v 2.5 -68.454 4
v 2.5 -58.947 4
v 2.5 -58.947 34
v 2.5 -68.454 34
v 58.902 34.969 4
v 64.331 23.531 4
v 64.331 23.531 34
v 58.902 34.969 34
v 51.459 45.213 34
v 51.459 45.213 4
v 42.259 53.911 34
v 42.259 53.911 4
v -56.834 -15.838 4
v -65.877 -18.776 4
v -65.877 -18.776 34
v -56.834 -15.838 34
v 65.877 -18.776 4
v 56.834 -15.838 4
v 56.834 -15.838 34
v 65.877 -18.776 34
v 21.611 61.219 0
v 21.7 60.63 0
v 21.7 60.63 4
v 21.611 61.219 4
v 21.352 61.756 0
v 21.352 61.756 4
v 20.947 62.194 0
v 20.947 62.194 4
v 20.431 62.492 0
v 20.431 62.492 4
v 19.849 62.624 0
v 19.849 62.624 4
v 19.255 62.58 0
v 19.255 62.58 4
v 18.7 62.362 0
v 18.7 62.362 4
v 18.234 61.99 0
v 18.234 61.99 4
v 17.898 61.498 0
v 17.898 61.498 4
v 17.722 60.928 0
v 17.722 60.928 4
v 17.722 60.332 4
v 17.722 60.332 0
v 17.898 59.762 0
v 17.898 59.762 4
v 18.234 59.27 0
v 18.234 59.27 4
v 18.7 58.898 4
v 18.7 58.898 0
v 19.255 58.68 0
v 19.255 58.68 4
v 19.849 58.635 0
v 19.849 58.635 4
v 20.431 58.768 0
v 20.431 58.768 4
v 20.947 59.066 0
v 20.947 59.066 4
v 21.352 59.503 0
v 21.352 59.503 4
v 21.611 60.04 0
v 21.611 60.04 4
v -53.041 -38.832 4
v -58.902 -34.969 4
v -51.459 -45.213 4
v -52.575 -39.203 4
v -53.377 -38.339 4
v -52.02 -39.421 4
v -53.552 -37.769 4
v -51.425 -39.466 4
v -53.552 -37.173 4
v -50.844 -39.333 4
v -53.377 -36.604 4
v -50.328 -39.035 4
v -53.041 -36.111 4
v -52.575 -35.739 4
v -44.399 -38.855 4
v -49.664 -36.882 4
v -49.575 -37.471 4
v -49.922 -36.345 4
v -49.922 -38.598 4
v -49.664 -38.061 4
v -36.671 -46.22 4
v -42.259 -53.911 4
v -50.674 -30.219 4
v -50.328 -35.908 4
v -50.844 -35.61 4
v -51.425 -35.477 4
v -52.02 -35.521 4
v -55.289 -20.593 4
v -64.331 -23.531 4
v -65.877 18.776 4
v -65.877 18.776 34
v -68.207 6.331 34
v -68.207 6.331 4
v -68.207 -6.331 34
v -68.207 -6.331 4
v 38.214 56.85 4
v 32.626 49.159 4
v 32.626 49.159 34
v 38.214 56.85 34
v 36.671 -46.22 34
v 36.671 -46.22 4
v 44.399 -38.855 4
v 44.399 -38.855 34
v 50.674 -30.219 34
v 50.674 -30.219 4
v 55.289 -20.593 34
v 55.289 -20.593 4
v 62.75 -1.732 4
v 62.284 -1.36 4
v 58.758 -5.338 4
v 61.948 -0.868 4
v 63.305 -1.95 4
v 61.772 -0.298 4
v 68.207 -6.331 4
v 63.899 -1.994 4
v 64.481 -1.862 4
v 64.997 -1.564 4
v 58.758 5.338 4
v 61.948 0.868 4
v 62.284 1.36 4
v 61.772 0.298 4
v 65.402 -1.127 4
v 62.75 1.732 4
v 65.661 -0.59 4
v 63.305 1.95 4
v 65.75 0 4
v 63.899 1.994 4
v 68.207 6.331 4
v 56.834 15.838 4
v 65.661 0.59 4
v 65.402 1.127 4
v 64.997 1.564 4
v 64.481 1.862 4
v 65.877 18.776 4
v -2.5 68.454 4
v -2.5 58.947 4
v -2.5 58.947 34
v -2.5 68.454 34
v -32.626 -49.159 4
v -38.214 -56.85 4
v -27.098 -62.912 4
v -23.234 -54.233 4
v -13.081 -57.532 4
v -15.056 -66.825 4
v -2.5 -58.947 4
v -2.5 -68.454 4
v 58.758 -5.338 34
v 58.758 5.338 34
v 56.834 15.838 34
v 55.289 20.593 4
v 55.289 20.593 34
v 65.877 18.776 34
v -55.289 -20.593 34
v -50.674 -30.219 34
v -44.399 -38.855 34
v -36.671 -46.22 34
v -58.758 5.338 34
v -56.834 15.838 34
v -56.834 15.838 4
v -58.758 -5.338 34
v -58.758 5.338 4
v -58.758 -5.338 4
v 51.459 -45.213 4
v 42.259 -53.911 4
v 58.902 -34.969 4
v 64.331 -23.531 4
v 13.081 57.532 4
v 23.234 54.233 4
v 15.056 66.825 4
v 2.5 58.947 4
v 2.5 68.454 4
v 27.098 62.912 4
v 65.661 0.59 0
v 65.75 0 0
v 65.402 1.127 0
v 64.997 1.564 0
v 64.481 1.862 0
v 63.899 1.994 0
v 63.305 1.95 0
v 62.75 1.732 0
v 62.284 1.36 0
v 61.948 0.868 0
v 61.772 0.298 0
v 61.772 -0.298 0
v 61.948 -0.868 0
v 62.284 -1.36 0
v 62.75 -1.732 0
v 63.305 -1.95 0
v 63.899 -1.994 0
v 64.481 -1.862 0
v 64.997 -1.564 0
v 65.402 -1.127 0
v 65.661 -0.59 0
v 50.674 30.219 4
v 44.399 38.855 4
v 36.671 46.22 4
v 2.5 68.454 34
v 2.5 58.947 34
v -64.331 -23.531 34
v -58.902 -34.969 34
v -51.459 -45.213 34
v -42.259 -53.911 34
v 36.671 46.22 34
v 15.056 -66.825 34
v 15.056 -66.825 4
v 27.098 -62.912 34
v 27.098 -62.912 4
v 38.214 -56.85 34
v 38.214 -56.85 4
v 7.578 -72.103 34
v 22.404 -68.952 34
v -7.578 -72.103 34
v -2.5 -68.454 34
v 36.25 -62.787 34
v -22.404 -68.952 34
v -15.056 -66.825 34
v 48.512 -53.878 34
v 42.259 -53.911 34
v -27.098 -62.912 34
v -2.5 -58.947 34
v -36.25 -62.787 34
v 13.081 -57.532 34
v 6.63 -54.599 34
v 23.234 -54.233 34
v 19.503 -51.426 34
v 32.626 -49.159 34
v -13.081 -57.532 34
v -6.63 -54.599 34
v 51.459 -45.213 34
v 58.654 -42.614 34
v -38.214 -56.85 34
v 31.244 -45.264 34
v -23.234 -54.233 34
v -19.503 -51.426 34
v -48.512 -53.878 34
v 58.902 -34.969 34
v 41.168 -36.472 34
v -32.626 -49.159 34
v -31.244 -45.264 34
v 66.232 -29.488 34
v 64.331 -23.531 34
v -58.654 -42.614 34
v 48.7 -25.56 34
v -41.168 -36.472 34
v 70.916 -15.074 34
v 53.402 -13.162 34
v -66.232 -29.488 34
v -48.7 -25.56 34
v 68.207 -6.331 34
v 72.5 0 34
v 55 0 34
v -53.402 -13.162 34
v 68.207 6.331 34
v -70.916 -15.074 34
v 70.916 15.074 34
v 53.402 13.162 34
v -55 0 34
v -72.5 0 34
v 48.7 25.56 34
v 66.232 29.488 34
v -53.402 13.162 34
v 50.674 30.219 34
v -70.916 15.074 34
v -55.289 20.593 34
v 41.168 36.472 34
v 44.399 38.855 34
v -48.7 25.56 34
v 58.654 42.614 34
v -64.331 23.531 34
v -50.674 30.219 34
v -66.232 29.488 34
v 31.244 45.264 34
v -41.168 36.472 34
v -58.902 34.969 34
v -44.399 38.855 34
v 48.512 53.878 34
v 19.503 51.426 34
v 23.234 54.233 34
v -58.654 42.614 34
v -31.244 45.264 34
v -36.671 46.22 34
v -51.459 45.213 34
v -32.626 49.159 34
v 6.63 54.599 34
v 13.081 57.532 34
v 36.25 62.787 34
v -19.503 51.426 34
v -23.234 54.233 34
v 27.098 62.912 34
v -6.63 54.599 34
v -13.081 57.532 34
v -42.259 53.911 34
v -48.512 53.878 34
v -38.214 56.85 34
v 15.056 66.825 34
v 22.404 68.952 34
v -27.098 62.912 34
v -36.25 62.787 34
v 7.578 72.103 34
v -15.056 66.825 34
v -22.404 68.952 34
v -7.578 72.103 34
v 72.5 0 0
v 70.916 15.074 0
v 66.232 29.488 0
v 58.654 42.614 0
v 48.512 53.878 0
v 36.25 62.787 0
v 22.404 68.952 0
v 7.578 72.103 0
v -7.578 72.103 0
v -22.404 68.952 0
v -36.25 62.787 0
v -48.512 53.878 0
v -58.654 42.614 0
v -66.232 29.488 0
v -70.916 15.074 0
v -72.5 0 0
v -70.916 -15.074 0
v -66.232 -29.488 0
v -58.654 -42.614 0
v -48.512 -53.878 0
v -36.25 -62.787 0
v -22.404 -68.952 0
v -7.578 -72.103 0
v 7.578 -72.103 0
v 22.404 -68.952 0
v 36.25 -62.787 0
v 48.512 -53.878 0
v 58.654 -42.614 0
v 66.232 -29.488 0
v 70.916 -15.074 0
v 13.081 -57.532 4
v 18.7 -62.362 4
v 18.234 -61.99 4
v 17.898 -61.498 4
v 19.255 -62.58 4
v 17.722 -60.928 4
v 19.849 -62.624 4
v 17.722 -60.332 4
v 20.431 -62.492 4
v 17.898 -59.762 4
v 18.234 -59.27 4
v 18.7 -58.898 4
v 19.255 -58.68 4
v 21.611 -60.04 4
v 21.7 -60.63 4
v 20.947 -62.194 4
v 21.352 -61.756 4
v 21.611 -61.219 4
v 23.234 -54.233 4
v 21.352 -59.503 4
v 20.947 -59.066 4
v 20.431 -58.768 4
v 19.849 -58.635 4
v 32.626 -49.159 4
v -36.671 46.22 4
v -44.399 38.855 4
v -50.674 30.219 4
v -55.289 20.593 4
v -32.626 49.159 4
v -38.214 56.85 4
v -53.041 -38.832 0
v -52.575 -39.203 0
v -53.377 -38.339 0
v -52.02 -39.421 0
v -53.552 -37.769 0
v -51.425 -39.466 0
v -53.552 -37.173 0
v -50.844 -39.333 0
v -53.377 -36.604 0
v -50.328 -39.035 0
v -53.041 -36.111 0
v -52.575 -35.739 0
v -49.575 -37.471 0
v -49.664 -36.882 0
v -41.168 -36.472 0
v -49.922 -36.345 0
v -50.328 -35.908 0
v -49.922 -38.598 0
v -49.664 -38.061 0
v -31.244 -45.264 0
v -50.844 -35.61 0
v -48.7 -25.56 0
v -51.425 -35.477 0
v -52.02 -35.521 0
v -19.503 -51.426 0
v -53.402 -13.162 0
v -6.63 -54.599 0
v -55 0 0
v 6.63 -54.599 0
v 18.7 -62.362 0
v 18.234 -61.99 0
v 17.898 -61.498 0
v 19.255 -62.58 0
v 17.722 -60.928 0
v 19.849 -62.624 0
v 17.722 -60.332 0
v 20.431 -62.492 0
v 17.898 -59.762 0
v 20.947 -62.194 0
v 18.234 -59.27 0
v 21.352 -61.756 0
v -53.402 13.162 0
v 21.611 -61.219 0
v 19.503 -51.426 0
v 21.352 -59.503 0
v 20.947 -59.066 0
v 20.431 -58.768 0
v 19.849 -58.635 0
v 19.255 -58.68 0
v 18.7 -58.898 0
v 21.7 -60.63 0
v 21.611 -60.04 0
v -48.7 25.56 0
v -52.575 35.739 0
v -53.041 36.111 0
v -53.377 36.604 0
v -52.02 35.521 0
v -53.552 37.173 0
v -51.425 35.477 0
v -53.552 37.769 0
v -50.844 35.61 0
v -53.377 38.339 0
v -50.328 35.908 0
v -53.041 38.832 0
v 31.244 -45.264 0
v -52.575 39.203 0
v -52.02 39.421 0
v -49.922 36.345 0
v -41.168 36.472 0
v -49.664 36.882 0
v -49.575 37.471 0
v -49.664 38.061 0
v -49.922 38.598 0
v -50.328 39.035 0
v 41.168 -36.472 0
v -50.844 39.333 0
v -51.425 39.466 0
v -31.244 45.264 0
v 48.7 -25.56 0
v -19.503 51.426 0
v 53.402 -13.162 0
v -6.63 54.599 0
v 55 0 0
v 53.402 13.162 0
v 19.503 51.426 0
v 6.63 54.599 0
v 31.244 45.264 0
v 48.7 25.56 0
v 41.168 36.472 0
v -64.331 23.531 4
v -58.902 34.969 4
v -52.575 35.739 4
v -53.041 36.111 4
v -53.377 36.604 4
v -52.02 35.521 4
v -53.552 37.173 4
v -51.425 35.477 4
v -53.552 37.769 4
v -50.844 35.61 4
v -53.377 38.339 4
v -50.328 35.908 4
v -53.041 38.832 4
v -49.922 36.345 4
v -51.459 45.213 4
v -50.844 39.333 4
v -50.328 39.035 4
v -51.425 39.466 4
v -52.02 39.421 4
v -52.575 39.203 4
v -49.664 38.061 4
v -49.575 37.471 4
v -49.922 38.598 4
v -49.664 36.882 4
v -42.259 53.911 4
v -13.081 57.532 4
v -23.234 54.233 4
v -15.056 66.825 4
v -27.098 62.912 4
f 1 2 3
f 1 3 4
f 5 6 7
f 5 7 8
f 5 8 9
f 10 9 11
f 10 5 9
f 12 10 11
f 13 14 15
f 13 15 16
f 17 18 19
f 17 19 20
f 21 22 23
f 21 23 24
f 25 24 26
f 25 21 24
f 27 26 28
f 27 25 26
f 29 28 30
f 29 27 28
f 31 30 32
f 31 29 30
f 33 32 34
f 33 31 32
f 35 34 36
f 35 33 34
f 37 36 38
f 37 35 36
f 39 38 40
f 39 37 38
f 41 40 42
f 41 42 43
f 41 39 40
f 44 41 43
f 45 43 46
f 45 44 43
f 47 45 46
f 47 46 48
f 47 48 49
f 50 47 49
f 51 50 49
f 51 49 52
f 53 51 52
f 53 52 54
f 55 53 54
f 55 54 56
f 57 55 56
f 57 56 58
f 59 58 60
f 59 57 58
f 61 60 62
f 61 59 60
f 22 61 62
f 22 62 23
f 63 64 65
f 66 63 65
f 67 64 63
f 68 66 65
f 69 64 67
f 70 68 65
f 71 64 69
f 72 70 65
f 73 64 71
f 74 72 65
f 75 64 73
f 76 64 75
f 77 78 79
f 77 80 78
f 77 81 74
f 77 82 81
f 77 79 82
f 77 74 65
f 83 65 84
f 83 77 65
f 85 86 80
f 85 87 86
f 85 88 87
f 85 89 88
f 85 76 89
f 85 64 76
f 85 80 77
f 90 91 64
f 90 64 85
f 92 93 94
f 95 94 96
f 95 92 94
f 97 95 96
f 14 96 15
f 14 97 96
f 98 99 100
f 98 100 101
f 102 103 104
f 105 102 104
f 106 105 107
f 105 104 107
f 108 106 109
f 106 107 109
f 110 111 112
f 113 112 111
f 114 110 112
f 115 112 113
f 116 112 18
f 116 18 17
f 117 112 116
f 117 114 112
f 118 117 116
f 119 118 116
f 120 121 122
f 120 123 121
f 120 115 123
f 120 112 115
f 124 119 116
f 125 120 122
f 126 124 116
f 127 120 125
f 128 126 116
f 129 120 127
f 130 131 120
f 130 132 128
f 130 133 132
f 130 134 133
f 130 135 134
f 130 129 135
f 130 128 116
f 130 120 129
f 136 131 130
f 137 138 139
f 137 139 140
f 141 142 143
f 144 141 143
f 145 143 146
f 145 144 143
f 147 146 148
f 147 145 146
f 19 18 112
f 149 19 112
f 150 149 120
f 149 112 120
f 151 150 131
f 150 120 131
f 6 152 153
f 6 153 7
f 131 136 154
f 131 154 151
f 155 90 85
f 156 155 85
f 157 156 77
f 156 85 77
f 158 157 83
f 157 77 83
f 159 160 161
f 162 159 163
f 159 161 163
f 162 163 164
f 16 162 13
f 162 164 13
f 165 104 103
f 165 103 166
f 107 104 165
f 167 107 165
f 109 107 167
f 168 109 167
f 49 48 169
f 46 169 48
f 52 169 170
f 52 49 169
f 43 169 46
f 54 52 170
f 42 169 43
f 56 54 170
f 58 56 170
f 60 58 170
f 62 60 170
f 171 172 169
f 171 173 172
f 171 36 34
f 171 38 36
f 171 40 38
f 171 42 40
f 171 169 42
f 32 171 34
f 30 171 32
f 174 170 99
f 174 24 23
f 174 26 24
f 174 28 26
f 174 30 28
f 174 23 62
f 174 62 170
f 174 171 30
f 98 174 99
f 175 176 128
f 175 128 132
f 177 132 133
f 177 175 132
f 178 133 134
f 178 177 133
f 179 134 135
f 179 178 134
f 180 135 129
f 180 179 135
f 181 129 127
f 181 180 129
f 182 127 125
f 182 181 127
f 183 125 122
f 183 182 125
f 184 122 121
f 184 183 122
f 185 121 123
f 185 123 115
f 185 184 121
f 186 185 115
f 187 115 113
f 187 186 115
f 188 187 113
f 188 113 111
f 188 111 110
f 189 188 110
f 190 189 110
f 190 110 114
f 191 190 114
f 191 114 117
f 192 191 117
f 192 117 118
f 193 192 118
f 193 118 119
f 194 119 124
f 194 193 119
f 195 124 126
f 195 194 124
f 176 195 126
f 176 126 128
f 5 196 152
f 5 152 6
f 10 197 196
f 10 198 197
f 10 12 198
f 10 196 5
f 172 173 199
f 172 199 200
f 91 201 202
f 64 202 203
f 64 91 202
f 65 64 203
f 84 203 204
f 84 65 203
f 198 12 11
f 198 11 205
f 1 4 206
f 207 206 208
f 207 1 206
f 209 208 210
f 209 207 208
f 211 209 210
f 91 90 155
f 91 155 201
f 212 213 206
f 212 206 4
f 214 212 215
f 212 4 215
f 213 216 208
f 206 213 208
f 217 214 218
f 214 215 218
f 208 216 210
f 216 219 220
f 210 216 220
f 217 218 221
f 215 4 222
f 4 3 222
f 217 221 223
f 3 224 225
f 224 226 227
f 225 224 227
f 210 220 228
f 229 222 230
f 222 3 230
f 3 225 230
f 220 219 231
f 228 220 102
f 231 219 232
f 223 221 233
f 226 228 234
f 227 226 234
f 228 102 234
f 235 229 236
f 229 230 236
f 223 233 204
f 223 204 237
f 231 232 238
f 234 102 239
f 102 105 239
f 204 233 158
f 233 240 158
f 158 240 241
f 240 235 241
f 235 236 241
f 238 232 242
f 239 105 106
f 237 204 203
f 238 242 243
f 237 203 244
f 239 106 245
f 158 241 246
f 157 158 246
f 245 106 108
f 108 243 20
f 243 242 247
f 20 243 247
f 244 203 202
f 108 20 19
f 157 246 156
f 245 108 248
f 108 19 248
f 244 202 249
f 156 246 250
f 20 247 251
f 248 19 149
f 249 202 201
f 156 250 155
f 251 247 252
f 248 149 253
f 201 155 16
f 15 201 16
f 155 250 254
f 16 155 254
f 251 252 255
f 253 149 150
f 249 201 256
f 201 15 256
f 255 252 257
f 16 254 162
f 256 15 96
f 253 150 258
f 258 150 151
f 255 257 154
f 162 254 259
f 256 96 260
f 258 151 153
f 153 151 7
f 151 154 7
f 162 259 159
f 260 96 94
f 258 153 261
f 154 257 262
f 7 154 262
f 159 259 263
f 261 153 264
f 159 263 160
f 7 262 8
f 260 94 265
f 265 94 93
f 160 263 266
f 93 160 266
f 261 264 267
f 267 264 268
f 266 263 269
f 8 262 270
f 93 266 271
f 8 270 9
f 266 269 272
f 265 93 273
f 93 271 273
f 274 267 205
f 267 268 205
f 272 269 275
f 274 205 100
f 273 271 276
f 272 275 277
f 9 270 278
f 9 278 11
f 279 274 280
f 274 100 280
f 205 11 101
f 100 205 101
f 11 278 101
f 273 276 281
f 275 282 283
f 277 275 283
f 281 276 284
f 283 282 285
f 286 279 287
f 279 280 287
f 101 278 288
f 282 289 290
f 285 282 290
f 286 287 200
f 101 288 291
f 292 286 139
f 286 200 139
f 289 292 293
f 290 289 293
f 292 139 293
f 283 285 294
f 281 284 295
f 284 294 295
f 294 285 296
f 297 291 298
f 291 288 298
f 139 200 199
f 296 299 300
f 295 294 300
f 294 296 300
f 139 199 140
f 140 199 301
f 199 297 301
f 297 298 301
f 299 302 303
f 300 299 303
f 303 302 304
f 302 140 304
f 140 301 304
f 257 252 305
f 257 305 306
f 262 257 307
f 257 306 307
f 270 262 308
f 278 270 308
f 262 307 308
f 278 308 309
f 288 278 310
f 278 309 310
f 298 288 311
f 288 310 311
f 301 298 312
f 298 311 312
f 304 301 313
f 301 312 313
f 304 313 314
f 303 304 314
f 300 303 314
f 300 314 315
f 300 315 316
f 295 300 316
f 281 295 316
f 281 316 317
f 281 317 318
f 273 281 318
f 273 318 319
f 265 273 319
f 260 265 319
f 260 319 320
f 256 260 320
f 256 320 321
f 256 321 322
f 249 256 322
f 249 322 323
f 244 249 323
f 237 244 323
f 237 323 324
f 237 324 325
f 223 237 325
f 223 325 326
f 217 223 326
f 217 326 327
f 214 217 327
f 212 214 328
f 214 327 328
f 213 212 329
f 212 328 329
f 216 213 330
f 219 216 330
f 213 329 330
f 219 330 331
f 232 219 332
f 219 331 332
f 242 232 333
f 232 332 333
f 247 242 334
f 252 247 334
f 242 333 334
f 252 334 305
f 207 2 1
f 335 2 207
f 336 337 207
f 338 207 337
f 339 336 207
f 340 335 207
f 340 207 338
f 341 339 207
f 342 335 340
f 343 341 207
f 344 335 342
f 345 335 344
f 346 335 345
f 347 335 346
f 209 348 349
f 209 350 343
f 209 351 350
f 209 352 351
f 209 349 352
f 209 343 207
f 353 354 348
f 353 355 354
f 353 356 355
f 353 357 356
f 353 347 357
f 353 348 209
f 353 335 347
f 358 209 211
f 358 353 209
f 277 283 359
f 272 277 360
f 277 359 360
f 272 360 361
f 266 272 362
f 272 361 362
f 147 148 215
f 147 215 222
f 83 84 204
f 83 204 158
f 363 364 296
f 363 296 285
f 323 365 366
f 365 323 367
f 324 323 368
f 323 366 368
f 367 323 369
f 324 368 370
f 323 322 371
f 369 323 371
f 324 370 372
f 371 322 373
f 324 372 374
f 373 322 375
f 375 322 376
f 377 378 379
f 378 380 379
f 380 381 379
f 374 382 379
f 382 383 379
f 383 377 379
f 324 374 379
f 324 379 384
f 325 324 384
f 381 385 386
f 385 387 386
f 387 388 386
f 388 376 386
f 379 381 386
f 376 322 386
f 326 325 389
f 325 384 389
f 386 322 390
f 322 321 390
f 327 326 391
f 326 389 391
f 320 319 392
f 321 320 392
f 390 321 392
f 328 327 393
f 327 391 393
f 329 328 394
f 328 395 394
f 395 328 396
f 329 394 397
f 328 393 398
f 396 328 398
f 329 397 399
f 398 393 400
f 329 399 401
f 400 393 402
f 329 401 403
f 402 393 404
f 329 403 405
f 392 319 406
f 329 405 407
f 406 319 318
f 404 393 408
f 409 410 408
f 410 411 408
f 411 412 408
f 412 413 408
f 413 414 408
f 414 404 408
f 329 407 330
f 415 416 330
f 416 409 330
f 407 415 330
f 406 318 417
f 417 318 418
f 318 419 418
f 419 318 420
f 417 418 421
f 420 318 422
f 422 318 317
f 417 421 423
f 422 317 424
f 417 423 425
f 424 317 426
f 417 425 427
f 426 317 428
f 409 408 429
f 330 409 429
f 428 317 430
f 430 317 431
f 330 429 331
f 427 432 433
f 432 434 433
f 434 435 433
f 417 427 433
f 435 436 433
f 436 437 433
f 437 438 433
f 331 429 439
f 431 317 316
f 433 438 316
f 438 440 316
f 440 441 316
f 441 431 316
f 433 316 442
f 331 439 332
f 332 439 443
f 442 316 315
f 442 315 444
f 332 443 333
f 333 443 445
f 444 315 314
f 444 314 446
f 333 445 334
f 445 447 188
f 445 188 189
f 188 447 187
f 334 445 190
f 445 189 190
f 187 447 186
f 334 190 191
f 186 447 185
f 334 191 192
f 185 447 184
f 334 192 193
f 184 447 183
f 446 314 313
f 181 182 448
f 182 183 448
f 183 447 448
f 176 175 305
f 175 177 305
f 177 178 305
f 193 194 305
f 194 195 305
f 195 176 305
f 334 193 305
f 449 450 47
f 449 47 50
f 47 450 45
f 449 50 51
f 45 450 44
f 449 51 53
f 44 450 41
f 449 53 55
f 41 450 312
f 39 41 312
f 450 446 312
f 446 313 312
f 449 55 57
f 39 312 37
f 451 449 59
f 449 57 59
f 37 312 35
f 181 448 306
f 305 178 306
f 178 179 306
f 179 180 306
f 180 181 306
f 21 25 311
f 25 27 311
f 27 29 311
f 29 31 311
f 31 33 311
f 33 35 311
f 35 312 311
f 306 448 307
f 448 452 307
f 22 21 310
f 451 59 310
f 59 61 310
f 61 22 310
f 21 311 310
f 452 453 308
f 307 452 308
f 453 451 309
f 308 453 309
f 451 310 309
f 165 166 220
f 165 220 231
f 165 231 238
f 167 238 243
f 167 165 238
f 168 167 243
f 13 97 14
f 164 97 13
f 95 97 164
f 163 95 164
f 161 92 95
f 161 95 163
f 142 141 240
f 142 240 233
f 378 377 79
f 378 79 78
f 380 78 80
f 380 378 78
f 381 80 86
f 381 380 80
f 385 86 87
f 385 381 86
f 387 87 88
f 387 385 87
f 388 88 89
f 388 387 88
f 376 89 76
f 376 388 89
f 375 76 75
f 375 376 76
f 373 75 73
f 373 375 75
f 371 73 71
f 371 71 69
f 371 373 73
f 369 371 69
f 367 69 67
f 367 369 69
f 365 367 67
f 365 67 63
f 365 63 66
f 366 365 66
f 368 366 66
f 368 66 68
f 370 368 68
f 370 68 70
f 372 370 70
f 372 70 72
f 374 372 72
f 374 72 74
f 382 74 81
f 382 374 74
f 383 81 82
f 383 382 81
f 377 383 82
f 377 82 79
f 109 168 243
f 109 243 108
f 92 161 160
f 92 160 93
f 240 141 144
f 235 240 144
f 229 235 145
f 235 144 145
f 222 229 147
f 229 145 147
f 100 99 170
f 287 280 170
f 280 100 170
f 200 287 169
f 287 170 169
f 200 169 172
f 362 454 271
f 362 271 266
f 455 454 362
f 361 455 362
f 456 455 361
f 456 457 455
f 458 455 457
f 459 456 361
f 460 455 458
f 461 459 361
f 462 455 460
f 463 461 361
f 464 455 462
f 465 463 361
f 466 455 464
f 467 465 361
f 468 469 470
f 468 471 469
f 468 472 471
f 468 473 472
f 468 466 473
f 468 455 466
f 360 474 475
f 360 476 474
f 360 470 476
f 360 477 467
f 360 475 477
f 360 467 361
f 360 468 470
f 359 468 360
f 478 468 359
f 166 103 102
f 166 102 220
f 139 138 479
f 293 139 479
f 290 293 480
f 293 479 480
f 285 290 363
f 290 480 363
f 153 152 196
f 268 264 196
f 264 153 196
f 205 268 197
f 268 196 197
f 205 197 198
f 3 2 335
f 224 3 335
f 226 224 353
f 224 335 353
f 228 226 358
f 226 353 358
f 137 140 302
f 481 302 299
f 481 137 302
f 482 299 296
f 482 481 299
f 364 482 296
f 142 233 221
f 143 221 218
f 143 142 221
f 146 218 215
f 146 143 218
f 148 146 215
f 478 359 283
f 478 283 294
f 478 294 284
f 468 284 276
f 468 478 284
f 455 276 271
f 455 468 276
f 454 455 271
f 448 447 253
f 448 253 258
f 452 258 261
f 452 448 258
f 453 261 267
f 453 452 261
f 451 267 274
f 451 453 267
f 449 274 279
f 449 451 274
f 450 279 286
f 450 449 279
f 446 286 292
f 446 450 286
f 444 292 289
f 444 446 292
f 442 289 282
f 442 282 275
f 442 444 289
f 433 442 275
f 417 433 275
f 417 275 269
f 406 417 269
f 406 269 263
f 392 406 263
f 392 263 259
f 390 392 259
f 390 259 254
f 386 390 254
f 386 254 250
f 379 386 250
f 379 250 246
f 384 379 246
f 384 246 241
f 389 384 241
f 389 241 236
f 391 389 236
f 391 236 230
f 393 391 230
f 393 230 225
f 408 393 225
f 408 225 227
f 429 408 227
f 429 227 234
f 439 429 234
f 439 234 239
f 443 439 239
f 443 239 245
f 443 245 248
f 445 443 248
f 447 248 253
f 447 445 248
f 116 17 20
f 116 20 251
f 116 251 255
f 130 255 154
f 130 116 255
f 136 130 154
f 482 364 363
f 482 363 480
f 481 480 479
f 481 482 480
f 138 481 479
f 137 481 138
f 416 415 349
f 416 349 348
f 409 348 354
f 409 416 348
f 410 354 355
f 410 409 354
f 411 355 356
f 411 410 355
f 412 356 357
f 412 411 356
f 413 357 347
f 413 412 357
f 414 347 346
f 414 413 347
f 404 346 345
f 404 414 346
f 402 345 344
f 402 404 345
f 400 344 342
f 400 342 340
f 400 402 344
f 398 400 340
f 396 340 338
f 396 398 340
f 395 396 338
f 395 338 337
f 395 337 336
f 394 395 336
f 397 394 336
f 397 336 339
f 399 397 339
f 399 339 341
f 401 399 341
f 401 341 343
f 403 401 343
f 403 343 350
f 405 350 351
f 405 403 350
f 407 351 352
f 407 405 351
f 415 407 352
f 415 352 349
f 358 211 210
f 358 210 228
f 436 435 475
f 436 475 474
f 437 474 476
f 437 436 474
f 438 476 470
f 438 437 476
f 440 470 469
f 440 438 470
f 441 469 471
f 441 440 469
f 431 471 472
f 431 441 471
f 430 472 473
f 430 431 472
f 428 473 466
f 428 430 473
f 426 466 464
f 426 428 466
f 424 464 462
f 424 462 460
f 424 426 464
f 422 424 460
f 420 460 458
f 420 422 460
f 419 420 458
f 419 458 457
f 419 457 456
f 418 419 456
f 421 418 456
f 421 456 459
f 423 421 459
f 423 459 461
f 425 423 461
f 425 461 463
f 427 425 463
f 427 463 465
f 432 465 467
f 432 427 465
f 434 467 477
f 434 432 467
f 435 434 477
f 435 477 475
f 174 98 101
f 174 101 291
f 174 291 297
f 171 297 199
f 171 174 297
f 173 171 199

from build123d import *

# Parameters (mm, degrees)
SZKIC1_R                    = 72.5
SZKIC1_R_2                  = 2
SZKIC1_R_3                  = 55
DODANIE_WYCI_GNI_CIE1_DEPTH = 4
SZKIC1_3_R                  = 72.5
SZKIC1_3_R_2                = 68.5
SZKIC1_3_R_3                = 59
SZKIC1_3_R_4                = 55
DODANIE_WYCI_GNI_CIE2_DEPTH = 34
DODANIE_WYCI_GNI_CIE3_DEPTH = 30
SZYK_KO_OWY1_COUNT          = 10


with BuildPart() as part:
    # Szkic1 → Dodanie-wyciągnięcie1 (new body)
    with BuildSketch(Plane.XY):
        Circle(SZKIC1_R)
        with Locations((19.699833391, 60.629852914)):
            Circle(SZKIC1_R_2, mode=Mode.SUBTRACT)
        with Locations((-51.574833391, -37.471309834)):
            Circle(SZKIC1_R_2, mode=Mode.SUBTRACT)
        with Locations((19.699833391, -60.629852914)):
            Circle(SZKIC1_R_2, mode=Mode.SUBTRACT)
        with Locations((-51.574833391, 37.471309834)):
            Circle(SZKIC1_R_2, mode=Mode.SUBTRACT)
        with Locations((63.75, 0)):
            Circle(SZKIC1_R_2, mode=Mode.SUBTRACT)
        Circle(SZKIC1_R_3, mode=Mode.SUBTRACT)
    extrude(amount=DODANIE_WYCI_GNI_CIE1_DEPTH)

    # Szkic1<3> → Dodanie-wyciągnięcie2 (add)
    # profile 1 of 2: a face of its own
    with BuildSketch(Plane.XY):
        Circle(SZKIC1_3_R)
        Circle(SZKIC1_3_R_2, mode=Mode.SUBTRACT)
    # profile 2 of 2: a face of its own
    with BuildSketch(Plane.XY):
        Circle(SZKIC1_3_R_3)
        Circle(SZKIC1_3_R_4, mode=Mode.SUBTRACT)
    extrude(amount=DODANIE_WYCI_GNI_CIE2_DEPTH)

    # Szkic2 → Dodanie-wyciągnięcie3 (add)
    with BuildSketch(Plane.XY.offset(4)):
        Polygon((-2.5, 58.947010102), (-2.5, 68.45436436), (0, 72.265754907), (2.5, 68.45436436), (2.5, 58.947010102), (0, 55.135619556), align=None)
    dodanie_wyci_gni_cie3 = extrude(amount=DODANIE_WYCI_GNI_CIE3_DEPTH)

    # Szyk kołowy1: Dodanie-wyciągnięcie3 ×10 about axis
    szyk_ko_owy1_axis = Axis((0, 0, 34), (0, 0, 1))
    for i in range(1, SZYK_KO_OWY1_COUNT):
        add(dodanie_wyci_gni_cie3.rotate(szyk_ko_owy1_axis, i * 360 / SZYK_KO_OWY1_COUNT))


solid = part.part
